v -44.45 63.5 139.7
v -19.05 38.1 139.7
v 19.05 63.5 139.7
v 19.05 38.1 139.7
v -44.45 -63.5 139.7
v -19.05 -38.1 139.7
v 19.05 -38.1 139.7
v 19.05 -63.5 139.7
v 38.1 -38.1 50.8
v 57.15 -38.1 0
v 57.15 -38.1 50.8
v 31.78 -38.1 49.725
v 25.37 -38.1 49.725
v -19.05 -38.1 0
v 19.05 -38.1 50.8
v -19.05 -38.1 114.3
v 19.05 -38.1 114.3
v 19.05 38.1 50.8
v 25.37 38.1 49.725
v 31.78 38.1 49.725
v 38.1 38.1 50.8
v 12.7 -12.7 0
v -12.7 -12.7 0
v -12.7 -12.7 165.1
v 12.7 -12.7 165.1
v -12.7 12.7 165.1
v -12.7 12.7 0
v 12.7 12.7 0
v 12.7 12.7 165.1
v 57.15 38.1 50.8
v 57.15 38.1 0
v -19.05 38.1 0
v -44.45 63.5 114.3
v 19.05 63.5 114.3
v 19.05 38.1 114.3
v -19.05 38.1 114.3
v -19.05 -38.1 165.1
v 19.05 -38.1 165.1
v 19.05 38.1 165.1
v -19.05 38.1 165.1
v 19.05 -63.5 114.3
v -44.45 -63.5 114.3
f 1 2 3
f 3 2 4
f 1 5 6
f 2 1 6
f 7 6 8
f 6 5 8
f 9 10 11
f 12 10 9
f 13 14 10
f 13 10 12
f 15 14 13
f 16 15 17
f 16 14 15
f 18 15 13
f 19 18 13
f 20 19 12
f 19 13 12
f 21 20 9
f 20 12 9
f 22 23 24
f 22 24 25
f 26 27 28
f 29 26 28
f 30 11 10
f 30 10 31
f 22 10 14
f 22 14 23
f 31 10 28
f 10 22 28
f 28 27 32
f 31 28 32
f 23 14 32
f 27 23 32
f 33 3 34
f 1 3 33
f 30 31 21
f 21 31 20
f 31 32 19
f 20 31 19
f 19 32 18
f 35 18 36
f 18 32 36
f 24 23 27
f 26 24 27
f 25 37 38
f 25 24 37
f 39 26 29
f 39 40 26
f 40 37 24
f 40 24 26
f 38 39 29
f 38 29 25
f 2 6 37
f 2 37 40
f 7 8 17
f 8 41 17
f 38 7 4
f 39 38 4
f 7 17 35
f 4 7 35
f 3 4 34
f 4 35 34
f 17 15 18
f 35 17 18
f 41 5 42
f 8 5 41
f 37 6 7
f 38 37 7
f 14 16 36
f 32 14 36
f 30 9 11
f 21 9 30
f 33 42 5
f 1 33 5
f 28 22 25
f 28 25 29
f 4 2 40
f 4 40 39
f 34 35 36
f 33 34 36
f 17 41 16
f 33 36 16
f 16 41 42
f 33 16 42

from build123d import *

# Parameters (mm, degrees)
F0_W      = 38.1
F0_H      = 76.2
F1_DEPTH  = 177.8
F2_W      = 76.2
F2_H      = 25.4
F3_DEPTH  = 25.4
F5_DEPTH  = 25.4
F7_DEPTH  = 25.4
F9_W      = 38.1
F9_H      = 76.2
F10_DEPTH = 25.4
F11_W     = 25.4
F11_H     = 25.4
F12_DEPTH = 228.6
F13_W     = 76.2
F13_H     = 50.8
F14_DEPTH = 38.1
F16_DEPTH = 228.6
F17_W     = 38.1
F17_H     = 76.2
F17_W_2   = 25.4
F17_H_2   = 25.4
F18_DEPTH = 38.1


with BuildPart() as f1:
    # F0 (on Top) → F1 (new body)
    with BuildSketch(Plane.XY):
        Rectangle(F0_W, F0_H)
    extrude(amount=F1_DEPTH)

    # F2 (on face) → F3 (join)
    with BuildSketch(Plane(origin=(-19.05, 0, 0), x_dir=(0, -1, 0), z_dir=(-1, 0, 0))):
        with Locations((0, 127)):
            Rectangle(F2_W, F2_H)
    extrude(amount=F3_DEPTH)

    # F4 (on face) → F5 (join)
    with BuildSketch(Plane.XZ.offset(38.1)):
        Polygon((-44.45, 139.7), (-44.45, 114.3), (-19.05, 114.3), (19.05, 114.3), (19.05, 139.7), (-19.05, 139.7), align=None)
    extrude(amount=F5_DEPTH)

    # F6 (on face) → F7 (join)
    with BuildSketch(Plane(origin=(0, 38.1, 0), x_dir=(-1, 0, 0), z_dir=(0, 1, 0))):
        Polygon((44.45, 114.3), (44.45, 139.7), (19.05, 139.7), (-19.05, 139.7), (-19.05, 114.3), (19.05, 114.3), align=None)
    extrude(amount=F7_DEPTH)

    # F9 (on face) → F10 (join)
    with BuildSketch(Plane.XY.offset(177.8)):
        Rectangle(F9_W, F9_H)
    extrude(amount=F10_DEPTH)

    # F11 (on face) → F12 (cut)
    with BuildSketch(Plane.XY.offset(203.2)):
        Rectangle(F11_W, F11_H)
    extrude(amount=-F12_DEPTH, mode=Mode.SUBTRACT)

    # F13 (on face) → F14 (join)
    with BuildSketch(Plane.YZ.offset(19.05)):
        with Locations((0, 25.4)):
            Rectangle(F13_W, F13_H)
    extrude(amount=F14_DEPTH)

    # F15 (on face) → F16 (cut)
    with BuildSketch(Plane.XZ.offset(38.1)):
        with BuildLine():
            Line((38.1, 50.8), (19.05, 50.8))
            ThreePointArc((19.05, 50.8), (28.575, 49.5901663726), (38.1, 50.8))
        make_face()
    extrude(amount=-F16_DEPTH, mode=Mode.SUBTRACT)

    # F17 (on face) → F18 (cut)
    with BuildSketch(Plane.XY.offset(203.2)):
        Rectangle(F17_W, F17_H)
        Rectangle(F17_W_2, F17_H_2, mode=Mode.SUBTRACT)
    extrude(amount=-F18_DEPTH, mode=Mode.SUBTRACT)


solid = f1.part
